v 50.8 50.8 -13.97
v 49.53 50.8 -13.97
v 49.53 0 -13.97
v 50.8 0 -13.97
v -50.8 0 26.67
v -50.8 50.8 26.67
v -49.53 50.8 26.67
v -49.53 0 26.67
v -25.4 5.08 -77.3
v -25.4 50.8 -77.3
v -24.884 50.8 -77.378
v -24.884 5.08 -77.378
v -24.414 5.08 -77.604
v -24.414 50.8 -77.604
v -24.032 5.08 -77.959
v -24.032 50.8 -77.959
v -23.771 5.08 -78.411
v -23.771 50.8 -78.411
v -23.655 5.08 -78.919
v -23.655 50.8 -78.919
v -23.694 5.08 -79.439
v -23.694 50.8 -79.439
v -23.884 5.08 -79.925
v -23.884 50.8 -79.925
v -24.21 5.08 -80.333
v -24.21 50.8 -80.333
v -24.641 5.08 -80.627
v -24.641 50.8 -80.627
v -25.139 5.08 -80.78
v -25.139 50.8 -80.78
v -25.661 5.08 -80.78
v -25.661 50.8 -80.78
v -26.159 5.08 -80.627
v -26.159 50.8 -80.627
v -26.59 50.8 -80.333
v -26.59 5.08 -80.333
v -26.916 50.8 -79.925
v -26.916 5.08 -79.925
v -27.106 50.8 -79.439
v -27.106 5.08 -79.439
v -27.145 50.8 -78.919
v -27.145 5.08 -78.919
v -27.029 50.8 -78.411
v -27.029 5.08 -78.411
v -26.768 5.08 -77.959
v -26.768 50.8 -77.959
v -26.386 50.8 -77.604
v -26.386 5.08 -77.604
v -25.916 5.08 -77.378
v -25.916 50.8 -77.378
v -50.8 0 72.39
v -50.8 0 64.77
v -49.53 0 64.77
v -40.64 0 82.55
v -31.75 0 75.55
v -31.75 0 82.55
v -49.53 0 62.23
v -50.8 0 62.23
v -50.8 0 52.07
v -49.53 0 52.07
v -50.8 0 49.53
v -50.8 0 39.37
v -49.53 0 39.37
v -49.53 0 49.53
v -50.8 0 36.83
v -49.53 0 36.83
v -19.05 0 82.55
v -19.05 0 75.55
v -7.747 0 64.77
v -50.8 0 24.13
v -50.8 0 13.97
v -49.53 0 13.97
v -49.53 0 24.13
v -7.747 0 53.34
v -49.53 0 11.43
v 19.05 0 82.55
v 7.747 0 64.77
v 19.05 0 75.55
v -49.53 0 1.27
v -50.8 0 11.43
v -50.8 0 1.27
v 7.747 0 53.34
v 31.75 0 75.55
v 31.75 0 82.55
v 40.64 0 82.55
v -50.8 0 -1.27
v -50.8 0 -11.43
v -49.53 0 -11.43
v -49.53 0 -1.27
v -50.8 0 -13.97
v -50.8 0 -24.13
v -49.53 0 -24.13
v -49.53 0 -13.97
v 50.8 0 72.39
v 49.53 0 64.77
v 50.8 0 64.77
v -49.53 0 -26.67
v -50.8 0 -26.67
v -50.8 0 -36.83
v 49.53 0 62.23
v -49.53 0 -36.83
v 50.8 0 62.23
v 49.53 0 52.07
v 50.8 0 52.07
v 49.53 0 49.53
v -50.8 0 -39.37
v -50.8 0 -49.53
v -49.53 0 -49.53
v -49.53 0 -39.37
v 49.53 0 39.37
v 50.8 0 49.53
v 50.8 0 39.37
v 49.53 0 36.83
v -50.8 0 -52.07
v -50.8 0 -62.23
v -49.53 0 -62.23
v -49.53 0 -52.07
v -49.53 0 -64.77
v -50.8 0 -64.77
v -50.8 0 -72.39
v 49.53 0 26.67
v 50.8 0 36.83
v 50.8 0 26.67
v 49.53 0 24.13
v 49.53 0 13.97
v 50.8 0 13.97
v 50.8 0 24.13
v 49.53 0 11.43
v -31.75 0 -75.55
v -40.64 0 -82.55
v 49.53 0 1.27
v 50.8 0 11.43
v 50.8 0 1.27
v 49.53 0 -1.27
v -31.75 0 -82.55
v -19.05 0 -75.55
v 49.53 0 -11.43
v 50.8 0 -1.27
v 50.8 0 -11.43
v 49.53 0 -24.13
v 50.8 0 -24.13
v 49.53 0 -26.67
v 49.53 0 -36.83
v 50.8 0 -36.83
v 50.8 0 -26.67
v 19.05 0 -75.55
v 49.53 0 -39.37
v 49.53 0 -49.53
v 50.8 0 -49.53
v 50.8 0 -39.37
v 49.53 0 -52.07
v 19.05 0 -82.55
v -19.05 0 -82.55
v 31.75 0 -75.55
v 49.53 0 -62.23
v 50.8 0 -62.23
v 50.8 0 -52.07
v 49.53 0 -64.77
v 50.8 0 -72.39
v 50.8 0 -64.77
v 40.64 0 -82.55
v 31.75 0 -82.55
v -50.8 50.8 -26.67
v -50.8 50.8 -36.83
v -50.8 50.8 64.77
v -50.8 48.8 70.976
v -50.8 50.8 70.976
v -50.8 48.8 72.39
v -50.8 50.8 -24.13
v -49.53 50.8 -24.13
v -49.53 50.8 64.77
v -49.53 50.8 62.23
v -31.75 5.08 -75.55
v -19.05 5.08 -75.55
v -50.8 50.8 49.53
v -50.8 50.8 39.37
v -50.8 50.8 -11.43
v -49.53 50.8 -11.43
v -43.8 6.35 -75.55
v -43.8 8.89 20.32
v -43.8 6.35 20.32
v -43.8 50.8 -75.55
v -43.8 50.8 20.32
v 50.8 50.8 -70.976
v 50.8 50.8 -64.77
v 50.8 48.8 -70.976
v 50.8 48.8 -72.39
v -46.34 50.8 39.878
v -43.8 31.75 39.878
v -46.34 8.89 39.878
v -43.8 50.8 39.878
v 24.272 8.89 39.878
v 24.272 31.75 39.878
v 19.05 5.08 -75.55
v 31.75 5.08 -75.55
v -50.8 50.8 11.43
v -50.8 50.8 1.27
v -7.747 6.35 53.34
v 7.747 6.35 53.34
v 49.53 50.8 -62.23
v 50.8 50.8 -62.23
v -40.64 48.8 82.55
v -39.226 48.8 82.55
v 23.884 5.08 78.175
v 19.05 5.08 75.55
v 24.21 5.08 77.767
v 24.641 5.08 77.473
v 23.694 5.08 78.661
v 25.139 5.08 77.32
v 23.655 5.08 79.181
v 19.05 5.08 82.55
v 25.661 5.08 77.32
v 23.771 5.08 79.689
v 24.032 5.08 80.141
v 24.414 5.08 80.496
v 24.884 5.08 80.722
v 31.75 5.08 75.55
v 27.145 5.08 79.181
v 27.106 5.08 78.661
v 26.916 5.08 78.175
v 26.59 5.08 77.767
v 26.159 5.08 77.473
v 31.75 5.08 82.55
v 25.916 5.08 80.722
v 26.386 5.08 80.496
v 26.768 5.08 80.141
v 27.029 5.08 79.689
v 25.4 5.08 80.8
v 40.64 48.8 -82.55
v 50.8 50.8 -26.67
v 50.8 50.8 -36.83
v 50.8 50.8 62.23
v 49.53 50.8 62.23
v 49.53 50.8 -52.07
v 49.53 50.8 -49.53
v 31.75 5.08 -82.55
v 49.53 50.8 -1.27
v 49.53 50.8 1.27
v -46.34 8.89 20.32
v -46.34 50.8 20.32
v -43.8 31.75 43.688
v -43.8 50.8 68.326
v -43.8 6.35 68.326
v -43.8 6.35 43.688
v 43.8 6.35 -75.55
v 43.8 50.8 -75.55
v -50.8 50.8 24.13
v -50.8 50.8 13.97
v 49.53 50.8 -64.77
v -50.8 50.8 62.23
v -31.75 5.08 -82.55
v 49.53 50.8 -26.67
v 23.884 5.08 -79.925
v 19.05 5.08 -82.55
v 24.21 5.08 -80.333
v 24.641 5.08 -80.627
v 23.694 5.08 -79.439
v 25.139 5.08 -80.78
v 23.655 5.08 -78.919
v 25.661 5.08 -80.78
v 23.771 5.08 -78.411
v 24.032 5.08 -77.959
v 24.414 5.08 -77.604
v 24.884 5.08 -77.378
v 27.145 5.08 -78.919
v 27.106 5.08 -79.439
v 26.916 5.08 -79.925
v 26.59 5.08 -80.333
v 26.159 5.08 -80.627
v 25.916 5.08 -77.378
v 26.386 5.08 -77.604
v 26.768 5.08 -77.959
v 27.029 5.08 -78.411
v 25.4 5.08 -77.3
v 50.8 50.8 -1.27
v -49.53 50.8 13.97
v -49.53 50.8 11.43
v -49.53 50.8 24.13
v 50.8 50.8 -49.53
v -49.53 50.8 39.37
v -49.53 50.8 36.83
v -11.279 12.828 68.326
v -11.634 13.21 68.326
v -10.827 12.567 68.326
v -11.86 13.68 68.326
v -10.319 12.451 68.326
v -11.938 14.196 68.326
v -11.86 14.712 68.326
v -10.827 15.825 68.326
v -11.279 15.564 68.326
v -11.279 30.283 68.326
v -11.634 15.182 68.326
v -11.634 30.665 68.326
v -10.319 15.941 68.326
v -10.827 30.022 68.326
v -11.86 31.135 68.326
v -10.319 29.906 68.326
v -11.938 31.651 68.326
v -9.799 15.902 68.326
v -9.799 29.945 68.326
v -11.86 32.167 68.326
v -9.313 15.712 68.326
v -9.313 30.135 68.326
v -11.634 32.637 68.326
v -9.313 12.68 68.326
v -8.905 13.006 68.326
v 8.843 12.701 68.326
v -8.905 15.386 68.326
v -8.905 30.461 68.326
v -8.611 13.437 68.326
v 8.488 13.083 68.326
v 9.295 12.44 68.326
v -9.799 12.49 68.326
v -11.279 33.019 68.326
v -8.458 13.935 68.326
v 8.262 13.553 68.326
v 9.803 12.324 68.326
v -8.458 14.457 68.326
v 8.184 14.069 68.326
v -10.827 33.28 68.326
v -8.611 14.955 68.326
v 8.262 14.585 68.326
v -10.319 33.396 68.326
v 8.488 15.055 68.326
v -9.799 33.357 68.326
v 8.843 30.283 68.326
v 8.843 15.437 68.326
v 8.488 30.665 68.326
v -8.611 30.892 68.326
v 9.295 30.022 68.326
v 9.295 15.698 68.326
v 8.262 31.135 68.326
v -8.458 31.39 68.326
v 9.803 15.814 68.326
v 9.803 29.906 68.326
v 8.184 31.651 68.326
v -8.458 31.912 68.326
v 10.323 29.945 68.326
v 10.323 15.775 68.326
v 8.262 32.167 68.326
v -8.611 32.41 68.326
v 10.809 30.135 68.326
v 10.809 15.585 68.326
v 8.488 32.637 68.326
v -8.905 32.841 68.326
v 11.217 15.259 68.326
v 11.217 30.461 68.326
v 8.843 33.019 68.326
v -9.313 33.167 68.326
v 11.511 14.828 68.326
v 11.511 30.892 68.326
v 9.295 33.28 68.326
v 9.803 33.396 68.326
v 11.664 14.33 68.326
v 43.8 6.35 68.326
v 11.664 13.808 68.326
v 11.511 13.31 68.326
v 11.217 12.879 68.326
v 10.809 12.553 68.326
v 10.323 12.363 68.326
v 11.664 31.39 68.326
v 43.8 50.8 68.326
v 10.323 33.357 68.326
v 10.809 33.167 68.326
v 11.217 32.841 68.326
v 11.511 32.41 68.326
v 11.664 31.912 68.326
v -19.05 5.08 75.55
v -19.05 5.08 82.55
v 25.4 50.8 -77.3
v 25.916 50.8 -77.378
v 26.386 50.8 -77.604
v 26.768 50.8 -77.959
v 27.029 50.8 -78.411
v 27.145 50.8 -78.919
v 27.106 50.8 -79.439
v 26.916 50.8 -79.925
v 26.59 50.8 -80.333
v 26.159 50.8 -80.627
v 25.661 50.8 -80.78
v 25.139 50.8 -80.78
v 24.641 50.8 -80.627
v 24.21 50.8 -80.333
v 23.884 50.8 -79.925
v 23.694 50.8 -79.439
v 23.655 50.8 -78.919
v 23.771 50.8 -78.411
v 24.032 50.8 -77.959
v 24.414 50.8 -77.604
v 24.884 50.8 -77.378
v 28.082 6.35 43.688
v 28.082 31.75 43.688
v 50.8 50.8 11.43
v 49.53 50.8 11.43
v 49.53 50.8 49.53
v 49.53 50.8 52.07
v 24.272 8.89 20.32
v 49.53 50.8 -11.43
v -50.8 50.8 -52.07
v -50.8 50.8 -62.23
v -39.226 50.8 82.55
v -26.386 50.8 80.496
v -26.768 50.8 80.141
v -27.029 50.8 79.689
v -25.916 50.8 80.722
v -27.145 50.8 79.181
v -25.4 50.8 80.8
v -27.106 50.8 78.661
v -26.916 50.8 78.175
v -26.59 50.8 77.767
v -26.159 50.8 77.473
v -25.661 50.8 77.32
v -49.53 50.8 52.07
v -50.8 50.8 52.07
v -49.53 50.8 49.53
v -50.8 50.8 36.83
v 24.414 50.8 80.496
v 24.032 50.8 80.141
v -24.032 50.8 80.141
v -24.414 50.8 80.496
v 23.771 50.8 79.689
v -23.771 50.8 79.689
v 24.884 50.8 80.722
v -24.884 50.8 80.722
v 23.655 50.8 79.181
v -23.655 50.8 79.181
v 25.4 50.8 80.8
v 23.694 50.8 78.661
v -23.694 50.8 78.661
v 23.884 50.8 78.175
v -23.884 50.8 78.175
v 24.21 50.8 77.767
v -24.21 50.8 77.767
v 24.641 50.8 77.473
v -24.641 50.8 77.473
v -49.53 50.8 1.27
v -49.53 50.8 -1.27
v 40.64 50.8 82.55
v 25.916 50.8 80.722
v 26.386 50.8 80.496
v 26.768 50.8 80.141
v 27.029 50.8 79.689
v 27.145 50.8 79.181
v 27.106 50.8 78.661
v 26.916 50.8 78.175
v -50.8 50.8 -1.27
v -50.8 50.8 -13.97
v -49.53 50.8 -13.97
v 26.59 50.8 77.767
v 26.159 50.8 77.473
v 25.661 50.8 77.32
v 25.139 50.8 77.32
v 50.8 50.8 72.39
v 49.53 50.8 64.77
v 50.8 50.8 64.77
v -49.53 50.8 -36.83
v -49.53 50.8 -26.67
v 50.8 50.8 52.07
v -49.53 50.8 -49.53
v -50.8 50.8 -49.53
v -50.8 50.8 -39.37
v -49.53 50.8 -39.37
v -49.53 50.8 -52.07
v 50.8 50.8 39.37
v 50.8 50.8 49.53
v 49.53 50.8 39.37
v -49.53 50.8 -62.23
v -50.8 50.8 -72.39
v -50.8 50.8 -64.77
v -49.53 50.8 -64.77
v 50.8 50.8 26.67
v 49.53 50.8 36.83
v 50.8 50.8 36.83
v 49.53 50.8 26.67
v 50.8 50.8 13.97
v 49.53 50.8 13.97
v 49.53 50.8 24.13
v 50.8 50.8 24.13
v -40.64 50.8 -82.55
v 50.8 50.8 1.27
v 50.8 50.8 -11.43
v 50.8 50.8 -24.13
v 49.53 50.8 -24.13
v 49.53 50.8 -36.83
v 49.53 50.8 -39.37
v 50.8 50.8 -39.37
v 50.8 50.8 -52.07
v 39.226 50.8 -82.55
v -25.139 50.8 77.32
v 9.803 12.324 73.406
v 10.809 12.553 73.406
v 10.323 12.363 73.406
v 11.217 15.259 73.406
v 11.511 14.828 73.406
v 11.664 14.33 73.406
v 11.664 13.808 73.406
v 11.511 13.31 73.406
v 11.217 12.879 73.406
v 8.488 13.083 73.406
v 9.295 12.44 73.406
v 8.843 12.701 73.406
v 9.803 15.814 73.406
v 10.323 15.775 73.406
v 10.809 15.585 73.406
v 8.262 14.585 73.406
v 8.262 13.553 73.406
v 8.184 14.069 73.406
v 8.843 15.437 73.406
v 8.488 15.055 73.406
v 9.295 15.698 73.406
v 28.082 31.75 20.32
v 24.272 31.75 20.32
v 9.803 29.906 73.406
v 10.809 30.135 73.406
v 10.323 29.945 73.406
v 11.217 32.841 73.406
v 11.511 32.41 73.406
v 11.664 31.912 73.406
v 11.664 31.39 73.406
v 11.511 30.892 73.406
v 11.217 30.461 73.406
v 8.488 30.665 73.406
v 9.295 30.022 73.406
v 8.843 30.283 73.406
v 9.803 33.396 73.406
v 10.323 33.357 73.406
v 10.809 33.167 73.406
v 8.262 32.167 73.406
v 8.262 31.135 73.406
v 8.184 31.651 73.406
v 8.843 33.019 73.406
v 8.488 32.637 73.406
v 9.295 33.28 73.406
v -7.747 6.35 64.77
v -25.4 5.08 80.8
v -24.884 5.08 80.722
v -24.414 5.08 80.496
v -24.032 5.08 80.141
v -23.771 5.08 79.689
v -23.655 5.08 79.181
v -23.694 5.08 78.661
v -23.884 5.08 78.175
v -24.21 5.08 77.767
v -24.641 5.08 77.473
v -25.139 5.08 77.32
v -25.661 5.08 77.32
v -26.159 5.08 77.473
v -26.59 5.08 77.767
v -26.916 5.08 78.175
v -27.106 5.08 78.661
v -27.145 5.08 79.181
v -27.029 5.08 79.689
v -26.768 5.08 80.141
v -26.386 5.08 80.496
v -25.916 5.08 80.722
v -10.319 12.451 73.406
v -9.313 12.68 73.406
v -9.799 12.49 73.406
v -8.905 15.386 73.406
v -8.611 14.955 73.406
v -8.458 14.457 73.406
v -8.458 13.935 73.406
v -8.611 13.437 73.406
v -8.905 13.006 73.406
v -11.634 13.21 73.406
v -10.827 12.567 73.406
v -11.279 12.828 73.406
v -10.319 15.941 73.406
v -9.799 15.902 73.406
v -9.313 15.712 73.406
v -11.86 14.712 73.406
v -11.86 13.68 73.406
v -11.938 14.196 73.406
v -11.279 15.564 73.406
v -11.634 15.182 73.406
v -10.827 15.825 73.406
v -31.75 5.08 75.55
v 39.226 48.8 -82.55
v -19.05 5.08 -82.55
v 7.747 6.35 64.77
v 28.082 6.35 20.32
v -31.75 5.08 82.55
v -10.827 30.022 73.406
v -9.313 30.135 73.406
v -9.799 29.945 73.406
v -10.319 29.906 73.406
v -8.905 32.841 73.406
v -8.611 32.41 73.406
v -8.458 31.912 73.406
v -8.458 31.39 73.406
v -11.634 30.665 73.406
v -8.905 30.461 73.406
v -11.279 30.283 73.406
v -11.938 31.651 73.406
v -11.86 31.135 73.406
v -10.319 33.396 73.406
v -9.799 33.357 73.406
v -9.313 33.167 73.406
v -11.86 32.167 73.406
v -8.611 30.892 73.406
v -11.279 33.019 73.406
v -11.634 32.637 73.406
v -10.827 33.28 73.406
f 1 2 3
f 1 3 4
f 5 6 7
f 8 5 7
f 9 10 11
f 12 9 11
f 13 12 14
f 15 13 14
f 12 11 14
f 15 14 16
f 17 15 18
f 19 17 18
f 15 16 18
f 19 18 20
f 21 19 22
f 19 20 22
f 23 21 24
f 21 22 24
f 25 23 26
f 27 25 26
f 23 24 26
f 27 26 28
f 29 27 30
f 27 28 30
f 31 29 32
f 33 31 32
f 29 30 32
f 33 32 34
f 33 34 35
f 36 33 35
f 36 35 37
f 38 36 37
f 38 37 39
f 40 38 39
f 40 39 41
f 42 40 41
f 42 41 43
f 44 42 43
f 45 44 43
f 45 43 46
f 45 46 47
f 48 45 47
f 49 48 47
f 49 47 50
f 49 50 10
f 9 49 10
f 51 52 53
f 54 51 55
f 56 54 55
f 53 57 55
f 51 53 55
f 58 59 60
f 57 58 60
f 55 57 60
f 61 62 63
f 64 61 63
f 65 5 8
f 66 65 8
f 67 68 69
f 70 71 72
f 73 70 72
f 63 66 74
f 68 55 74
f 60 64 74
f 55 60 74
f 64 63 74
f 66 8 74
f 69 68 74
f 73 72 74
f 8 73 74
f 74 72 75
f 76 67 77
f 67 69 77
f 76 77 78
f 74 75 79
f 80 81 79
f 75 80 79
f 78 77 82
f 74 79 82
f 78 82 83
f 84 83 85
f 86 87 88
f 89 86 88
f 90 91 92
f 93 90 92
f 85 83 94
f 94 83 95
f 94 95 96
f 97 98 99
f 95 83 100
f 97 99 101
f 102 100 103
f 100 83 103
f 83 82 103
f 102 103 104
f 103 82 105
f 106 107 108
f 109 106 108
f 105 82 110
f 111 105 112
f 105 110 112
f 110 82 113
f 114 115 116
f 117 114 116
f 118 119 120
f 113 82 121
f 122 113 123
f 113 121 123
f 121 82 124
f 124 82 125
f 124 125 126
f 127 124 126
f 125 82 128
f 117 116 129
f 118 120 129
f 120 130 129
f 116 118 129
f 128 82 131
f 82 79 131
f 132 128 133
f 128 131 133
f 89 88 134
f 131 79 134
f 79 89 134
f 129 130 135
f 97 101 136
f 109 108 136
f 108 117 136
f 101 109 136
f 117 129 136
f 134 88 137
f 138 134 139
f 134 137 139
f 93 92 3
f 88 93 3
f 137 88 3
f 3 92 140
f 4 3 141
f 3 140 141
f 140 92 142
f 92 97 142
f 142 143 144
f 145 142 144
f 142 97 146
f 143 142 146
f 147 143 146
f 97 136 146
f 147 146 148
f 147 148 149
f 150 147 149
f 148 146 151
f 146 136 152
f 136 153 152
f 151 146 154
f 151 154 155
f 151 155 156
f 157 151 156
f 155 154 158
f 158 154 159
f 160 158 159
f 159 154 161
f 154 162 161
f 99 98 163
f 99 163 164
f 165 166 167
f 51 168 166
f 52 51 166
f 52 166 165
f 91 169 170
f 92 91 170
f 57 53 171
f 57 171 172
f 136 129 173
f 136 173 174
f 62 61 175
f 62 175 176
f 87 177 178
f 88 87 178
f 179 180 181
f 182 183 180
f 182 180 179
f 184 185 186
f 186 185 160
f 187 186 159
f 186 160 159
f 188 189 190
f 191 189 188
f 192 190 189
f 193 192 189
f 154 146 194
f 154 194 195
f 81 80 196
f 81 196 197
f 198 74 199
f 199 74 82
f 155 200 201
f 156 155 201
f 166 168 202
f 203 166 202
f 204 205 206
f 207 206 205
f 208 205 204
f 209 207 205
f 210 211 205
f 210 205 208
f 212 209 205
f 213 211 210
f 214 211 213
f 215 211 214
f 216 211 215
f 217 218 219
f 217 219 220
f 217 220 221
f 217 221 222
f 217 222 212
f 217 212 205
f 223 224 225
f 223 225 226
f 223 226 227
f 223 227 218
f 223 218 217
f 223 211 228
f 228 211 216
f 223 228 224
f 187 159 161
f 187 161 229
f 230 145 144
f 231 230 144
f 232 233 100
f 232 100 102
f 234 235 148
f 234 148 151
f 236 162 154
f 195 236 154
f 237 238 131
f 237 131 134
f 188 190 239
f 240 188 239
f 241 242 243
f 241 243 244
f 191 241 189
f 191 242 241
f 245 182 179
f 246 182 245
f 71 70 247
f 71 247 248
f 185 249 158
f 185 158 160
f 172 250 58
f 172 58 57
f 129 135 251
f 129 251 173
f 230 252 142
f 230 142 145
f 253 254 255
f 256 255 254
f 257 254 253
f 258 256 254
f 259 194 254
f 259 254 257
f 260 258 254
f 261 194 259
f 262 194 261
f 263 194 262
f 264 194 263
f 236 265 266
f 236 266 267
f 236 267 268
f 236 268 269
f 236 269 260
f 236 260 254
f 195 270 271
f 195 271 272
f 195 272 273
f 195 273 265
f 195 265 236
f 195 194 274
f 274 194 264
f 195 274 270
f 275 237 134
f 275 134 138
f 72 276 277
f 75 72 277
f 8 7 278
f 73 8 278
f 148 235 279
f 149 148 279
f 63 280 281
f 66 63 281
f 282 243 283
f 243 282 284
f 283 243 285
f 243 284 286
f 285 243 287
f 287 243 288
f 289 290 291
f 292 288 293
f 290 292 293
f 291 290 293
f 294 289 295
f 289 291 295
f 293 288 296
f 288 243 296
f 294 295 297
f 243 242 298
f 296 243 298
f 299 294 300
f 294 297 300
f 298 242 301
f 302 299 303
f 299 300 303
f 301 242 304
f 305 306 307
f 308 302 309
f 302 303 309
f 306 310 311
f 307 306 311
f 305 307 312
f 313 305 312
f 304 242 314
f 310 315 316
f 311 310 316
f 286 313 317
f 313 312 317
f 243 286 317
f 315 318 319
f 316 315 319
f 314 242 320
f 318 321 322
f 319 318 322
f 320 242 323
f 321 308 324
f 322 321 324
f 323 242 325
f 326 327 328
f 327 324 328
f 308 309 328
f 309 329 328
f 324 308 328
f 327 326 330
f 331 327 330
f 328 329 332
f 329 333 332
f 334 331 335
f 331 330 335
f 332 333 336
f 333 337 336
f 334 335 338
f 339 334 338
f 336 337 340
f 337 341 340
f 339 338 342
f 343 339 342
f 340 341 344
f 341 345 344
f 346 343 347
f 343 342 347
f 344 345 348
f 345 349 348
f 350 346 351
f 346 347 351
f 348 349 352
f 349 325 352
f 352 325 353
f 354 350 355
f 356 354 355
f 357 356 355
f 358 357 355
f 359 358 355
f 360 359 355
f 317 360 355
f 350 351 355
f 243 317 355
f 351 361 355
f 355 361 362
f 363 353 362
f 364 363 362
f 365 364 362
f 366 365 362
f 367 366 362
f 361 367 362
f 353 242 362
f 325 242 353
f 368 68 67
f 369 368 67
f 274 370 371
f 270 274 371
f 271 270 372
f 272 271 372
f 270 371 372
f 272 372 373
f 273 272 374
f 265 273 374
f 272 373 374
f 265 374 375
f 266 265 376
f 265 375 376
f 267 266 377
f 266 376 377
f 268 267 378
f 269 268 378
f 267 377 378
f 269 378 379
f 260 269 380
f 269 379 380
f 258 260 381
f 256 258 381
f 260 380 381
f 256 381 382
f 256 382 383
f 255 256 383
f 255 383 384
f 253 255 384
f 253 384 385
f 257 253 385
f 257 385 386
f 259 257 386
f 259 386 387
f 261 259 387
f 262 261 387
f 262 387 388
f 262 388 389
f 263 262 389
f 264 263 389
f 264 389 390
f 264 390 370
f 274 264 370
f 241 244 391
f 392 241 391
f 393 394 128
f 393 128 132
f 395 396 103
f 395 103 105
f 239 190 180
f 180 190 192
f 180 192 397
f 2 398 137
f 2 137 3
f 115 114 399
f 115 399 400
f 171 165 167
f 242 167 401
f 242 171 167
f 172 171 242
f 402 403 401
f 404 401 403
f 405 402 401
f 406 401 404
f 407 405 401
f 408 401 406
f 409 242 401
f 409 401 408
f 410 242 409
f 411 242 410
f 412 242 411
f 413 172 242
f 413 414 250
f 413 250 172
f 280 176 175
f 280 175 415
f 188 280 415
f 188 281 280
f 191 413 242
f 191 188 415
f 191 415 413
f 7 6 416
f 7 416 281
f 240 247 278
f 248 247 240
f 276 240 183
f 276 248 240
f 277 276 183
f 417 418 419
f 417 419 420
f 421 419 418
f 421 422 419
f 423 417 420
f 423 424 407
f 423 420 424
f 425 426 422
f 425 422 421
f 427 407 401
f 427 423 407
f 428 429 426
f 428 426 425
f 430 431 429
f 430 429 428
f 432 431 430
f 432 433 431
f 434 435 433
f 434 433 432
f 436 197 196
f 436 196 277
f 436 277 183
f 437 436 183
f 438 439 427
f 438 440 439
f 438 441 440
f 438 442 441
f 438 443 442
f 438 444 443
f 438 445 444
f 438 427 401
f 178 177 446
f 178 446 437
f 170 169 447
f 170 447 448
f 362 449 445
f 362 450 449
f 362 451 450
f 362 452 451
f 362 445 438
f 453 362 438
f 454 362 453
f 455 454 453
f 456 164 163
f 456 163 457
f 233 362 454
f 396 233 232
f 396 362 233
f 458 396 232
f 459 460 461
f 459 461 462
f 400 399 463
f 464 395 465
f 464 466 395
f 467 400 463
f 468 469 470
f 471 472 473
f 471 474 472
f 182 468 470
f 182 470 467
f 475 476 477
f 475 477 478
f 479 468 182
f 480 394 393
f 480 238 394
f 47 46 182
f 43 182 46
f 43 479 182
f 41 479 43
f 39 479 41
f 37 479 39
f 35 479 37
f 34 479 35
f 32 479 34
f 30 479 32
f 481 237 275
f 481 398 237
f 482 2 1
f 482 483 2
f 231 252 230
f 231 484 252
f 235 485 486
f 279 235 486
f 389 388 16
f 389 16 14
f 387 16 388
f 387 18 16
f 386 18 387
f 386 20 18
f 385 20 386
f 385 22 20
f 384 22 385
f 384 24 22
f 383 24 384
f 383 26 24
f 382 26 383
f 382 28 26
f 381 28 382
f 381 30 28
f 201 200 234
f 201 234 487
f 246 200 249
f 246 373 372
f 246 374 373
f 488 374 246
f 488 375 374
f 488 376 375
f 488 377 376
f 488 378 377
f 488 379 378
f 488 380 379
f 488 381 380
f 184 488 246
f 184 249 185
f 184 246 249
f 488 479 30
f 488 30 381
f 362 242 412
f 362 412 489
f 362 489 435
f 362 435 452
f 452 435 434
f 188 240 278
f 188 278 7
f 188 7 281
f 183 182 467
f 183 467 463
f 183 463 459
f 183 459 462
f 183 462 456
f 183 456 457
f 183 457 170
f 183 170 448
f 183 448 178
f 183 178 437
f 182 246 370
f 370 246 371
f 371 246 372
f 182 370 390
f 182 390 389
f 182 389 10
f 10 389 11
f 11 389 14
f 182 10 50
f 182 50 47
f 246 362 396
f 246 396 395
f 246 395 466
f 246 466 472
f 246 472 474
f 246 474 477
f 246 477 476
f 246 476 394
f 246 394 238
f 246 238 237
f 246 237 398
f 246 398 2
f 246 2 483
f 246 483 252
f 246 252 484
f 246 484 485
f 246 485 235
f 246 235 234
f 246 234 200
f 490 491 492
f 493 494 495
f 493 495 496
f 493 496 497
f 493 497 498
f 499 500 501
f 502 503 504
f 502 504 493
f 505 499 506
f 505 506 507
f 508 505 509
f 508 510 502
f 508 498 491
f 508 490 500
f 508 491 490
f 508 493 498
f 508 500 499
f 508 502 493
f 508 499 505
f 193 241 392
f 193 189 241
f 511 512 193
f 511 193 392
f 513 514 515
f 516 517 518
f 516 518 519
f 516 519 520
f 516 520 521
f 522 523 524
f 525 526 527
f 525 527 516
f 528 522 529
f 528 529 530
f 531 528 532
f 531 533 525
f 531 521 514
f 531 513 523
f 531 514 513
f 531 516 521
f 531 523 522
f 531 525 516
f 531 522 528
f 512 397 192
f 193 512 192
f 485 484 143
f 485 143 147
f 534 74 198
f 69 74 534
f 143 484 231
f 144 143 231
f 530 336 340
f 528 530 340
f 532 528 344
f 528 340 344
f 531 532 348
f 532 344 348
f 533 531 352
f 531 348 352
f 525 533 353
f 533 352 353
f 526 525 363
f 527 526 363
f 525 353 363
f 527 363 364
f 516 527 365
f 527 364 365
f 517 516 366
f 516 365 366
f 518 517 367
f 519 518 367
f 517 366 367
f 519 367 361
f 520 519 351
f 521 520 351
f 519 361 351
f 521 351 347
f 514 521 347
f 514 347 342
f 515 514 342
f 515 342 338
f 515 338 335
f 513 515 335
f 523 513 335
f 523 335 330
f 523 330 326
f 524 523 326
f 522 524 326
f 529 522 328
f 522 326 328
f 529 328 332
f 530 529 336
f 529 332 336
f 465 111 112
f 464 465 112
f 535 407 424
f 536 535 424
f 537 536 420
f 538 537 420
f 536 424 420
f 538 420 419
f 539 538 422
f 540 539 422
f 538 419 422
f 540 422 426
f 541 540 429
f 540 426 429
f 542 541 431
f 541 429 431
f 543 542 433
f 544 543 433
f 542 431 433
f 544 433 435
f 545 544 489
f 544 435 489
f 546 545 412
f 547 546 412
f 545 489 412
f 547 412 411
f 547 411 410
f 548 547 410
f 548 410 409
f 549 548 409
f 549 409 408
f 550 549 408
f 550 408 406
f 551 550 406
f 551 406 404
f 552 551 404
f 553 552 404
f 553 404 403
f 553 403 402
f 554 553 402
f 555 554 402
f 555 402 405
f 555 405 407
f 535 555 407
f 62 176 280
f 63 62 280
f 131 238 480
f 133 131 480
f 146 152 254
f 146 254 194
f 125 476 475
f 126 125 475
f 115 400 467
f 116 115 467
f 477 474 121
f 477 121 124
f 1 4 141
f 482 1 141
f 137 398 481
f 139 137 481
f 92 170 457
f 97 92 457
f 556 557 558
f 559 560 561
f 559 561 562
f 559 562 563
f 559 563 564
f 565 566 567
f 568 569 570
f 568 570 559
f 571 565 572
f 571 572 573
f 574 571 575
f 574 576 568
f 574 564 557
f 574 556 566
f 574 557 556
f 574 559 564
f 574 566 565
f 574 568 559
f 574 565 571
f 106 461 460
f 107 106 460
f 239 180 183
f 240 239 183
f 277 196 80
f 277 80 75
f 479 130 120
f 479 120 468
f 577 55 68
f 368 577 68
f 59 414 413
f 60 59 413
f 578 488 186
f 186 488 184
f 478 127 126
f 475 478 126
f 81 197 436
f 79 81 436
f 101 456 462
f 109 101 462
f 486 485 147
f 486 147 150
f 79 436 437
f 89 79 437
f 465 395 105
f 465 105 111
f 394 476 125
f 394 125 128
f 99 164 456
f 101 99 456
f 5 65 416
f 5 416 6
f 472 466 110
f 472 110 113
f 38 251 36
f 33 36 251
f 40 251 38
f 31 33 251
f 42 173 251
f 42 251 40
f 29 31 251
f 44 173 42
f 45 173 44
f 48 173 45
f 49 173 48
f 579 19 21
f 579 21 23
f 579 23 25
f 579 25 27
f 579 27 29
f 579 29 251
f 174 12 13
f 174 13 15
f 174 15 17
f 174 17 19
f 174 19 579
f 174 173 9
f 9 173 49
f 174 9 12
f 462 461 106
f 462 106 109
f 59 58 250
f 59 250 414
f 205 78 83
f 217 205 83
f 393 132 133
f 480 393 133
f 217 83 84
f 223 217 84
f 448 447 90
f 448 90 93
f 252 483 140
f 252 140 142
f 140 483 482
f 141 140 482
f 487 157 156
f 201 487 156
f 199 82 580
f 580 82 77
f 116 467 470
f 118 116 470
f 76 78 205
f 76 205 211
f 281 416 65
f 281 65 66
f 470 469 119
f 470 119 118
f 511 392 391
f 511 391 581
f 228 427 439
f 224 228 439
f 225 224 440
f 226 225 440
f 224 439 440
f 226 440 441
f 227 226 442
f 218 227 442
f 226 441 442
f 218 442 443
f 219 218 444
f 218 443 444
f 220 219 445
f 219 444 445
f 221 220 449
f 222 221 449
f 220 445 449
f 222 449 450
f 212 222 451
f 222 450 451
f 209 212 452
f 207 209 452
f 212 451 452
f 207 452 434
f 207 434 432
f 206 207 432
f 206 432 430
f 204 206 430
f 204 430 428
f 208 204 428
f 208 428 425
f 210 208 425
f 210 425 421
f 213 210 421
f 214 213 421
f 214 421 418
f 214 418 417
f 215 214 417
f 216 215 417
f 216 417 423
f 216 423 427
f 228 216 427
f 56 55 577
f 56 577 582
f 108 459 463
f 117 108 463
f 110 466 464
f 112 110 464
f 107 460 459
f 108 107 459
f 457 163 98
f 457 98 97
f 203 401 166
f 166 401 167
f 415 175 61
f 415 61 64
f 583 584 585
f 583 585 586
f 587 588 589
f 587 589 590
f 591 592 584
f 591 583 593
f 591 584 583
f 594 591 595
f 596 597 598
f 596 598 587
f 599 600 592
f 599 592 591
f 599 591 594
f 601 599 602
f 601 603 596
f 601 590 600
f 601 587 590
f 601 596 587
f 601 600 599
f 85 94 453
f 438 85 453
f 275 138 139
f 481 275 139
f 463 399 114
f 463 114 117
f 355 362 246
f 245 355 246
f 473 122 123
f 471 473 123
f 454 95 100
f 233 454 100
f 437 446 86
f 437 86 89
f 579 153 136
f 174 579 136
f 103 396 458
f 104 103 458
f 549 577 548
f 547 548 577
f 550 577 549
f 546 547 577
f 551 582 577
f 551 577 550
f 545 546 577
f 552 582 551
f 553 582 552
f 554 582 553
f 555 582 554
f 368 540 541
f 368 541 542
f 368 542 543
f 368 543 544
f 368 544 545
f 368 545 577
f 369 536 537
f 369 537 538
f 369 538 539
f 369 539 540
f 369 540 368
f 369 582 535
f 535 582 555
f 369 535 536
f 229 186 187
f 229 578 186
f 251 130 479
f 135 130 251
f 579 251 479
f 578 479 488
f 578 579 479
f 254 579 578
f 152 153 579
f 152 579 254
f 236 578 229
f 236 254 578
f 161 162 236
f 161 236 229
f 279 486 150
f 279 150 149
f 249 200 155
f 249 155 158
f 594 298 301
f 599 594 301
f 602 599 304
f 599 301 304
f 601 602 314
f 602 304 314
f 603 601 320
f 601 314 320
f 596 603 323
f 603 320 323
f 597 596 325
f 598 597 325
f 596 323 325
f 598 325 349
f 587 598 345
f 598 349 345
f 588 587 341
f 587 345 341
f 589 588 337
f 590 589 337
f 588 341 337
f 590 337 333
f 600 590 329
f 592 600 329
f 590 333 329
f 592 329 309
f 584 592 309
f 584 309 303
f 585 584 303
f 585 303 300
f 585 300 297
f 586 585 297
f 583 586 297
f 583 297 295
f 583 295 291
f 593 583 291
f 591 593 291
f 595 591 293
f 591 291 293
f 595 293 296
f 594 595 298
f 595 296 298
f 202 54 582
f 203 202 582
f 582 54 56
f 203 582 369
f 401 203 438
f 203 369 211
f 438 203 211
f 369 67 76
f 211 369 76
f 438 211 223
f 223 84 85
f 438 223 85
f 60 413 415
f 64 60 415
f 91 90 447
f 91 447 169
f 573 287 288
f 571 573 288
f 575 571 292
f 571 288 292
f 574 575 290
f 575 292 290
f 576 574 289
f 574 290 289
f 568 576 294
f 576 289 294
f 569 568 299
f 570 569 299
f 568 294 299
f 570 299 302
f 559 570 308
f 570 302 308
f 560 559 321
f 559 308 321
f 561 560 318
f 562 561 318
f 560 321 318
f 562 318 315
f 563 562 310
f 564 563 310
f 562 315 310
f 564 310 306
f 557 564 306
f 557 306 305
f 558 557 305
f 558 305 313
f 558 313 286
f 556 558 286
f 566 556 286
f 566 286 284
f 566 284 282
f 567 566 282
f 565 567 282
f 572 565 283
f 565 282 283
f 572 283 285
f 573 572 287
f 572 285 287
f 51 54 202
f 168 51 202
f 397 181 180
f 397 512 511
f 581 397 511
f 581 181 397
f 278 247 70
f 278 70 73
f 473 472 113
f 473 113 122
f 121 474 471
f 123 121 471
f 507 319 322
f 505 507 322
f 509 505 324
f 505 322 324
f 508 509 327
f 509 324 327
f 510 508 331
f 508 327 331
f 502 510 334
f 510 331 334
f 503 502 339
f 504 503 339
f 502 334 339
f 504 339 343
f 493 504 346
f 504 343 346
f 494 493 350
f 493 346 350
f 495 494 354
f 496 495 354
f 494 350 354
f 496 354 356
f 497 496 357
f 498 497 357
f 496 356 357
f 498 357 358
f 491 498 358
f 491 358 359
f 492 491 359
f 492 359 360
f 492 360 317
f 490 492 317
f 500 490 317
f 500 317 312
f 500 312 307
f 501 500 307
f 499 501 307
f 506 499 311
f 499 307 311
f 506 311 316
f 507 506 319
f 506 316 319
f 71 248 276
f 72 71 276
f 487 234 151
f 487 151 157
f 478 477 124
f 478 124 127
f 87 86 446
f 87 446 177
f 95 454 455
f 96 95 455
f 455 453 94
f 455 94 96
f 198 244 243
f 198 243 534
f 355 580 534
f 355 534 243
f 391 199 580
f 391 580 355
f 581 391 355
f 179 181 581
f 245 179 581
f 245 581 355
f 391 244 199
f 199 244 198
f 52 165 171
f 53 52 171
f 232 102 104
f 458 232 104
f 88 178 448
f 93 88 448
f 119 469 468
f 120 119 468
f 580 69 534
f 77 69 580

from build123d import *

# Parameters (mm, degrees)
SKETCH1_W           = 101.6
SKETCH1_H           = 165.1
BOSS_EXTRUDE1_DEPTH = 50.8
SKETCH2_W           = 2.54
SKETCH2_H           = 2.54
CUT_EXTRUDE1_DEPTH  = 110.433918417
CHAMFER1_SIZE       = 10.16
SKETCH3_W           = 87.6
SKETCH3_H           = 143.876
CUT_EXTRUDE2_DEPTH  = 44.45
CUT_EXTRUDE3_DEPTH  = 2
SKETCH5_R           = 1.750000056
CUT_EXTRUDE4_DEPTH  = 110.433918417
SKETCH6_W           = 12.7
SKETCH6_H           = 6.999986
SKETCH6_H_2         = 6.999987499
CUT_EXTRUDE5_DEPTH  = 5.08
SKETCH7_W           = 15.494
SKETCH7_H           = 11.43
CUT_EXTRUDE6_DEPTH  = 110.433918417
SKETCH9_R           = 1.75
CUT_EXTRUDE7_DEPTH  = 5.08
SKETCH10_W          = 68.072
SKETCH10_H          = 19.558
BOSS_EXTRUDE2_DEPTH = 2.54
BOSS_EXTRUDE3_DEPTH = 25.4
SKETCH12_W          = 19.558
SKETCH12_H          = 41.91
CUT_EXTRUDE8_DEPTH  = 2.54


with BuildPart() as part:
    # Sketch1 → Boss-Extrude1 (new body)
    with BuildSketch(Plane(origin=(0, 0, 0), x_dir=(1, 0, 0), z_dir=(0, 1, 0))):
        Rectangle(SKETCH1_W, SKETCH1_H)
    extrude(amount=BOSS_EXTRUDE1_DEPTH)

    # Sketch2 → Cut-Extrude1 (cut, through all)
    with BuildSketch(Plane(origin=(0, 50.8, 0), x_dir=(1, 0, 0), z_dir=(0, 1, 0))):
        with Locations((-50.8, -63.5)):
            Rectangle(SKETCH2_W, SKETCH2_H)
        with Locations((50.8, -63.5)):
            Rectangle(SKETCH2_W, SKETCH2_H)
        with Locations((-50.8, -50.8)):
            Rectangle(SKETCH2_W, SKETCH2_H)
        with Locations((50.8, -50.8)):
            Rectangle(SKETCH2_W, SKETCH2_H)
        with Locations((-50.8, -38.1)):
            Rectangle(SKETCH2_W, SKETCH2_H)
        with Locations((50.8, -38.1)):
            Rectangle(SKETCH2_W, SKETCH2_H)
        with Locations((-50.8, -25.4)):
            Rectangle(SKETCH2_W, SKETCH2_H)
        with Locations((50.8, -25.4)):
            Rectangle(SKETCH2_W, SKETCH2_H)
        with Locations((-50.8, -12.7)):
            Rectangle(SKETCH2_W, SKETCH2_H)
        with Locations((50.8, -12.7)):
            Rectangle(SKETCH2_W, SKETCH2_H)
        with Locations((-50.8, 0)):
            Rectangle(SKETCH2_W, SKETCH2_H)
        with Locations((50.8, 0)):
            Rectangle(SKETCH2_W, SKETCH2_H)
        with Locations((-50.8, 12.7)):
            Rectangle(SKETCH2_W, SKETCH2_H)
        with Locations((50.8, 12.7)):
            Rectangle(SKETCH2_W, SKETCH2_H)
        with Locations((-50.8, 25.4)):
            Rectangle(SKETCH2_W, SKETCH2_H)
        with Locations((50.8, 25.4)):
            Rectangle(SKETCH2_W, SKETCH2_H)
        with Locations((-50.8, 38.1)):
            Rectangle(SKETCH2_W, SKETCH2_H)
        with Locations((50.8, 38.1)):
            Rectangle(SKETCH2_W, SKETCH2_H)
        with Locations((-50.8, 50.8)):
            Rectangle(SKETCH2_W, SKETCH2_H)
        with Locations((50.8, 50.8)):
            Rectangle(SKETCH2_W, SKETCH2_H)
        with Locations((-50.8, 63.5)):
            Rectangle(SKETCH2_W, SKETCH2_H)
        with Locations((50.8, 63.5)):
            Rectangle(SKETCH2_W, SKETCH2_H)
    extrude(amount=-CUT_EXTRUDE1_DEPTH, mode=Mode.SUBTRACT)

    # Chamfer1
    chamfer1_edges = [part.edges().sort_by_distance(p)[0] for p in [
        (50.8, 25.4, 82.55),
        (-50.8, 25.4, 82.55),
        (-50.8, 25.4, -82.55),
        (50.8, 25.4, -82.55),
    ]]
    chamfer(chamfer1_edges, length=CHAMFER1_SIZE)

    # Sketch3 → Cut-Extrude2 (cut)
    with BuildSketch(Plane(origin=(0, 50.8, 0), x_dir=(1, 0, 0), z_dir=(0, 1, 0))):
        with Locations((0, 3.612)):
            Rectangle(SKETCH3_W, SKETCH3_H)
    extrude(amount=-CUT_EXTRUDE2_DEPTH, mode=Mode.SUBTRACT)

    # Sketch4 → Cut-Extrude3 (cut)
    with BuildSketch(Plane(origin=(0, 50.8, 0), x_dir=(1, 0, 0), z_dir=(0, 1, 0))):
        Polygon((45.012893219, 76.762893219), (50.8, 70.975786438), (50.8, 72.39), (40.64, 82.55), (39.225786438, 82.55), align=None)
        Polygon((-45.012893219, -76.762893219), (-50.8, -70.975786438), (-50.8, -72.39), (-40.64, -82.55), (-39.225786438, -82.55), align=None)
    extrude(amount=-CUT_EXTRUDE3_DEPTH, mode=Mode.SUBTRACT)

    # Sketch5 → Cut-Extrude4 (cut, through all)
    with BuildSketch(Plane(origin=(0, 50.8, 0), x_dir=(1, 0, 0), z_dir=(0, 1, 0))):
        with Locations(Location((-25.4, -79.05, 0), (0, 0, 270))):
            Circle(SKETCH5_R)
        with Locations(Location((25.4, -79.05, 0), (0, 0, 270))):
            Circle(SKETCH5_R)
        with Locations(Location((25.4, 79.05, 0), (0, 0, 270))):
            Circle(SKETCH5_R)
        with Locations(Location((-25.4, 79.05, 0), (0, 0, 270))):
            Circle(SKETCH5_R)
    extrude(amount=-CUT_EXTRUDE4_DEPTH, mode=Mode.SUBTRACT)

    # Sketch6 → Cut-Extrude5 (cut)
    with BuildSketch(Plane.XZ):
        with Locations((-25.4, 79.050007)):
            Rectangle(SKETCH6_W, SKETCH6_H)
        with Locations((25.4, 79.050007)):
            Rectangle(SKETCH6_W, SKETCH6_H)
        with Locations((-25.4, -79.050007)):
            Rectangle(SKETCH6_W, SKETCH6_H)
        with Locations((25.4, -79.050006251)):
            Rectangle(SKETCH6_W, SKETCH6_H_2)
    extrude(amount=-CUT_EXTRUDE5_DEPTH, mode=Mode.SUBTRACT)

    # Sketch7 → Cut-Extrude6 (cut, through all)
    with BuildSketch(Plane.XZ):
        with Locations((0, 59.055)):
            Rectangle(SKETCH7_W, SKETCH7_H)
    extrude(amount=-CUT_EXTRUDE6_DEPTH, mode=Mode.SUBTRACT)

    # Sketch9 → Cut-Extrude7 (cut)
    with BuildSketch(Plane(origin=(0, 0, 68.326), x_dir=(-1, 0, 0), z_dir=(0, 0, -1))):
        with Locations((-9.933999944, 31.651)):
            Circle(SKETCH9_R)
        with Locations((10.187999944, 31.650999944)):
            Circle(SKETCH9_R)
        with Locations((10.187999944, 14.196)):
            Circle(SKETCH9_R)
        with Locations((-9.933999944, 14.069000056)):
            Circle(SKETCH9_R)
    extrude(amount=-CUT_EXTRUDE7_DEPTH, mode=Mode.SUBTRACT)

    # Sketch10 → Boss-Extrude2 (add)
    with BuildSketch(Plane(origin=(0, 6.35, 0), x_dir=(1, 0, 0), z_dir=(0, 1, 0))):
        with Locations((-9.764, -30.099)):
            Rectangle(SKETCH10_W, SKETCH10_H)
    extrude(amount=BOSS_EXTRUDE2_DEPTH)

    # Sketch11 → Boss-Extrude3 (add)
    with BuildSketch(Plane(origin=(0, 6.35, 0), x_dir=(1, 0, 0), z_dir=(0, 1, 0))):
        Polygon((-43.8, -43.688), (28.082, -43.688), (28.082, -20.32), (24.272, -20.32), (24.272, -39.878), (-43.8, -39.878), align=None)
    extrude(amount=BOSS_EXTRUDE3_DEPTH)

    # Sketch12 → Cut-Extrude8 (cut)
    with BuildSketch(Plane(origin=(-43.8, 0, 0), x_dir=(0, 0, -1), z_dir=(1, 0, 0))):
        with Locations((-30.099, 29.845)):
            Rectangle(SKETCH12_W, SKETCH12_H)
    extrude(amount=-CUT_EXTRUDE8_DEPTH, mode=Mode.SUBTRACT)


solid = part.part
